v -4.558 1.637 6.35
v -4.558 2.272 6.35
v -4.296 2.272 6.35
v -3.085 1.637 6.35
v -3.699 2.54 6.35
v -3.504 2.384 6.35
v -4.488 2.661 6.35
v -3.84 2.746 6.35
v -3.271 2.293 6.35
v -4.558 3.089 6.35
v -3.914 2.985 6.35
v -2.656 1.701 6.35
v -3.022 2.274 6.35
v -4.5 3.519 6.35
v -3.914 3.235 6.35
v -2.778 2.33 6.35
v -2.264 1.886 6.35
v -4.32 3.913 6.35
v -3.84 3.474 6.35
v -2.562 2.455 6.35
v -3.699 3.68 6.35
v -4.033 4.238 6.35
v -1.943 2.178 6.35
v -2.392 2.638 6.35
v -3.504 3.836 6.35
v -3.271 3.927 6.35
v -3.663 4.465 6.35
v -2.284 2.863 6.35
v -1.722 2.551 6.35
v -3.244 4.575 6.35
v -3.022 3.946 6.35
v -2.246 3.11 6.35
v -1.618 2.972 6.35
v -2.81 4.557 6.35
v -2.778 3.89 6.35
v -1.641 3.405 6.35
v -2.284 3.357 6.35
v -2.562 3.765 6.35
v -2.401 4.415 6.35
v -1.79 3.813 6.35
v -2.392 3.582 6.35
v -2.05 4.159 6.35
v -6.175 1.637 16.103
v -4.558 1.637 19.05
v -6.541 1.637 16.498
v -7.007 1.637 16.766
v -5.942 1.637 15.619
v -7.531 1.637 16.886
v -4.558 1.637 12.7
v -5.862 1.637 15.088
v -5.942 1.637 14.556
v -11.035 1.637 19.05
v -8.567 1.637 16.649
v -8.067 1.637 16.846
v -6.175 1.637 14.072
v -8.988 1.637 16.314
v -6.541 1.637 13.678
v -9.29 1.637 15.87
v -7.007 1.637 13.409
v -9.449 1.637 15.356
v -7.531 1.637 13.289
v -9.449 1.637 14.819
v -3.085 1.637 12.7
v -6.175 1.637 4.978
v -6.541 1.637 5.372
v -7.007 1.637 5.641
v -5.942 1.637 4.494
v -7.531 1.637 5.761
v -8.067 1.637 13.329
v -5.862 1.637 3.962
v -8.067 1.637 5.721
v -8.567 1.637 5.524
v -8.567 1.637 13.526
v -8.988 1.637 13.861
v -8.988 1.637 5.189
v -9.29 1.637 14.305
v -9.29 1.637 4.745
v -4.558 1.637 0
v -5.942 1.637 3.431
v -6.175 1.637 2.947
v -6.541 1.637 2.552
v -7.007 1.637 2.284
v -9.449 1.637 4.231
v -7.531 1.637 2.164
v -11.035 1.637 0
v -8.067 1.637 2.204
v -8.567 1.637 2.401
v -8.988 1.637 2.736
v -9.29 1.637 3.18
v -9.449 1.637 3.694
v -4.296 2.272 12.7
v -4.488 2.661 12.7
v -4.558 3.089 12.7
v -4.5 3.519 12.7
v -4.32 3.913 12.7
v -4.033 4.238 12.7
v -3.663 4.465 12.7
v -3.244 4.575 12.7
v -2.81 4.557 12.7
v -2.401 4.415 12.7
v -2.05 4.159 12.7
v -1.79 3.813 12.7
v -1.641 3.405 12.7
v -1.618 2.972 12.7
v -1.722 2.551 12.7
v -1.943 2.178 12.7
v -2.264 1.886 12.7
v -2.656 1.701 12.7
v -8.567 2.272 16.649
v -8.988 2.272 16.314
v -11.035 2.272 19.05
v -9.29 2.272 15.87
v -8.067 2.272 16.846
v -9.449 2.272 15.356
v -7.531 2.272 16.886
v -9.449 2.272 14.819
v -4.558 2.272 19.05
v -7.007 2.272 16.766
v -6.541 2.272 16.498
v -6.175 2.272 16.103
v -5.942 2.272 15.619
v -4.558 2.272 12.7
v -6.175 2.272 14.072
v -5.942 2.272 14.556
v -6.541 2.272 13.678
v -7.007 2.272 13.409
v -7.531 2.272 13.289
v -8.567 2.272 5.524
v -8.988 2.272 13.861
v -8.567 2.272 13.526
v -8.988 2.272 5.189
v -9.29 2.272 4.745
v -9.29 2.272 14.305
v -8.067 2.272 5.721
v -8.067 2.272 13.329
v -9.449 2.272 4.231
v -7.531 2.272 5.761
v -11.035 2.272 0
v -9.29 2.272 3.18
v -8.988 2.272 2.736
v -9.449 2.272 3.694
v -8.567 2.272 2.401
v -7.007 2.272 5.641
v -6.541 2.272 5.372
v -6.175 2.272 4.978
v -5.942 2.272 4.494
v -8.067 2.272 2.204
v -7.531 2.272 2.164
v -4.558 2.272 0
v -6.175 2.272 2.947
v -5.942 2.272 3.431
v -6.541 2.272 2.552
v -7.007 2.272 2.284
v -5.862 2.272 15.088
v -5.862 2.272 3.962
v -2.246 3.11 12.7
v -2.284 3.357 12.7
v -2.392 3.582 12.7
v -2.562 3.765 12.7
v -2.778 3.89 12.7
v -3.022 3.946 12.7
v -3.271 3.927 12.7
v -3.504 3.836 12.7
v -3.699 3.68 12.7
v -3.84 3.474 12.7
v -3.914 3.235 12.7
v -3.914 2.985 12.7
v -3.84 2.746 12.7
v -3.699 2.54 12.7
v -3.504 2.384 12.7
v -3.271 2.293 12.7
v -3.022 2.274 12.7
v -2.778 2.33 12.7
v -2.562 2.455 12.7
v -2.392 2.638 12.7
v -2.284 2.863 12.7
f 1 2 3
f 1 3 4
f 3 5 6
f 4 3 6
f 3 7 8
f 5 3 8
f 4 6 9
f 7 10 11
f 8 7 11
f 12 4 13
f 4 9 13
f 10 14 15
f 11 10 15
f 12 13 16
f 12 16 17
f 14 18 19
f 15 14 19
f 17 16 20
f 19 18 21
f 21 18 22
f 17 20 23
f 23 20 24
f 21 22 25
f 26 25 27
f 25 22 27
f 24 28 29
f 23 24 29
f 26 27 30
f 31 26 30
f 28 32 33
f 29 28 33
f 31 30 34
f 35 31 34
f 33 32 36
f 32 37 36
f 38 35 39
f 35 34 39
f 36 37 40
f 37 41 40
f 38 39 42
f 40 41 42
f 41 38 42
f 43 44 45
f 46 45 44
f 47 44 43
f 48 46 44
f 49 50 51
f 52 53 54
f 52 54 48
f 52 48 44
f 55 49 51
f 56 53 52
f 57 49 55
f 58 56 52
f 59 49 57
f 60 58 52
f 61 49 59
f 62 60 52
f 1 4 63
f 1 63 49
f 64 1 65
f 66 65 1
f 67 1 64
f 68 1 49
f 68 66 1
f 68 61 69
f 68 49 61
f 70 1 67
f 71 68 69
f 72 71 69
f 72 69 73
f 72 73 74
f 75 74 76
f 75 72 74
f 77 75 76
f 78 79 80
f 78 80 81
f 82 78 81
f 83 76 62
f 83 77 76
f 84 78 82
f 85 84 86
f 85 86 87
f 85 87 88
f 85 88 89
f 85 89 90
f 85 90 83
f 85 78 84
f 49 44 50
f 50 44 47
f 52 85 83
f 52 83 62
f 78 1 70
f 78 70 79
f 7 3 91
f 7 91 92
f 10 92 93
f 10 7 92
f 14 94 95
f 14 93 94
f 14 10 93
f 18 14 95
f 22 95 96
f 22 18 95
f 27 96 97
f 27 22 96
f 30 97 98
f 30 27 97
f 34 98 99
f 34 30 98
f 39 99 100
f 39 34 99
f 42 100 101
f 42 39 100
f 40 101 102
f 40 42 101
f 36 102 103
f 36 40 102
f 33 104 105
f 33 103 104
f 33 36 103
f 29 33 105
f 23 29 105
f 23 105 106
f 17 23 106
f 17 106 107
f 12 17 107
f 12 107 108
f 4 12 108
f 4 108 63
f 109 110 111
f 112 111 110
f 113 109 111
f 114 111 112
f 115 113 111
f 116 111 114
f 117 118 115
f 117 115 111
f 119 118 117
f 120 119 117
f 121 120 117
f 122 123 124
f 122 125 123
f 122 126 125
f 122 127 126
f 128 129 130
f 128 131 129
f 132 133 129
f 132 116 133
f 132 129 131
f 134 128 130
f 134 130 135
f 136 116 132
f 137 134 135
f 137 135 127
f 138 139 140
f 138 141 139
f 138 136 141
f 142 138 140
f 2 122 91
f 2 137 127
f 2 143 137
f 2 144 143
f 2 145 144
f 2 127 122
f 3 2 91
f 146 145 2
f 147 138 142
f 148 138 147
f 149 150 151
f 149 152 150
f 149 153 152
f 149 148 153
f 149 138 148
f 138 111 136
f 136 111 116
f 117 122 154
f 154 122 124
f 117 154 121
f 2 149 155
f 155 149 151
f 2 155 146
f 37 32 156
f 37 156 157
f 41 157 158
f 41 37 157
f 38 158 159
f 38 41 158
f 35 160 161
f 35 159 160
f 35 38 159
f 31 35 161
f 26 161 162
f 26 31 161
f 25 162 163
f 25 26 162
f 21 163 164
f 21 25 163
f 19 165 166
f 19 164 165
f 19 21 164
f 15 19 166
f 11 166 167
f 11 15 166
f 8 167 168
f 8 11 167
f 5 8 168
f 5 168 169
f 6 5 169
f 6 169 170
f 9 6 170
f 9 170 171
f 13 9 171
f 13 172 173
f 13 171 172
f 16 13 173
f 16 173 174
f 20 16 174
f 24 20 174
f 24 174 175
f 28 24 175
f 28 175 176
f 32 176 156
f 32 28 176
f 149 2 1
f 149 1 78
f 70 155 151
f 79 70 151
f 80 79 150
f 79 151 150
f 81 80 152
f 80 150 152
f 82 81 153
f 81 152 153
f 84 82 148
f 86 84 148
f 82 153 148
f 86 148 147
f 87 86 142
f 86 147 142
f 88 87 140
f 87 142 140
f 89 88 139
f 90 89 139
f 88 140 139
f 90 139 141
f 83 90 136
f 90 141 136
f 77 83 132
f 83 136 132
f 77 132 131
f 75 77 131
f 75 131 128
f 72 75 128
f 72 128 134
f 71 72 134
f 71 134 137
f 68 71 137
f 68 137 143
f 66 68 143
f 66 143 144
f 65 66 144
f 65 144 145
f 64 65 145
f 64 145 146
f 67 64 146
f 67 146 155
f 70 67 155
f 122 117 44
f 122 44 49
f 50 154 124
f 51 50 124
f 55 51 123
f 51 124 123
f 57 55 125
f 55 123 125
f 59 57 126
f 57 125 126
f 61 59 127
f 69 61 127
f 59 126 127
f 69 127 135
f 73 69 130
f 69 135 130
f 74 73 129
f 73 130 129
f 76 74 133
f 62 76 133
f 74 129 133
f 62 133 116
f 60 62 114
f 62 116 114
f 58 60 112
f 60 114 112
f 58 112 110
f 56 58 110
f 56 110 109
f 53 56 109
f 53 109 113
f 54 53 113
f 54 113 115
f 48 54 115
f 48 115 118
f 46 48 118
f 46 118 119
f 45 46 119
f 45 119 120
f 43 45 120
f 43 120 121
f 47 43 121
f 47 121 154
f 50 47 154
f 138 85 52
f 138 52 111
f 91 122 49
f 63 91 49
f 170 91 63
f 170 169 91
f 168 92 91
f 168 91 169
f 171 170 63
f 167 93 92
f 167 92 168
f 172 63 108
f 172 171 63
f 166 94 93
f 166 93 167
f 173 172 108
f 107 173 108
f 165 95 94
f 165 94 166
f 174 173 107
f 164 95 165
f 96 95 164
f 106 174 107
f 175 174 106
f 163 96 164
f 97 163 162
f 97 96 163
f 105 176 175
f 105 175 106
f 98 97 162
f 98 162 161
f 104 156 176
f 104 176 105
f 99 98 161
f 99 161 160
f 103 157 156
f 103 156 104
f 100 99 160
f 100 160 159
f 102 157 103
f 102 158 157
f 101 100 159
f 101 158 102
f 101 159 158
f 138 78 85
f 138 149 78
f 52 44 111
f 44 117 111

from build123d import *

# Parameters (mm, degrees)
SKETCH1_R           = 0.8382
BOSS_EXTRUDE1_DEPTH = 19.05
CUT_EXTRUDE1_START  = 76.2
SKETCH2_R           = 1.8034
SKETCH2_W           = 2.9464
SKETCH2_H           = 6.35
CUT_EXTRUDE1_DEPTH  = 127


with BuildPart() as part:
    # Sketch1 → Boss-Extrude1 (new body)
    with BuildSketch(Plane.XY):
        with BuildLine():
            Line((-11.0348776, 1.636724806), (-11.0348776, 2.271724806))
            Line((-11.0348776, 2.271724806), (-4.296180386, 2.271724806))
            ThreePointArc((-4.296180386, 2.271724806), (-2.400761669, 4.41475324), (-3.0846776, 1.636724806))
            Line((-3.0846776, 1.636724806), (-11.0348776, 1.636724806))
        make_face()
        with Locations((-3.0846776, 3.109924806)):
            Circle(SKETCH1_R, mode=Mode.SUBTRACT)
    extrude(amount=BOSS_EXTRUDE1_DEPTH)

    # Sketch2 → Cut-Extrude1 (cut)
    with BuildSketch(Plane(origin=(0, 2.271724806, 0), x_dir=(1, 0, 0), z_dir=(0, 1, 0)).offset(CUT_EXTRUDE1_START)):
        with Locations((-7.665528993, -3.9624)):
            Circle(SKETCH2_R)
        with Locations((-7.665528993, -15.0876)):
            Circle(SKETCH2_R)
        with Locations((-3.0846776, -3.175)):
            Rectangle(SKETCH2_W, SKETCH2_H)
        with Locations((-3.0846776, -15.875)):
            Rectangle(SKETCH2_W, SKETCH2_H)
    extrude(amount=-CUT_EXTRUDE1_DEPTH, mode=Mode.SUBTRACT)


solid = part.part
